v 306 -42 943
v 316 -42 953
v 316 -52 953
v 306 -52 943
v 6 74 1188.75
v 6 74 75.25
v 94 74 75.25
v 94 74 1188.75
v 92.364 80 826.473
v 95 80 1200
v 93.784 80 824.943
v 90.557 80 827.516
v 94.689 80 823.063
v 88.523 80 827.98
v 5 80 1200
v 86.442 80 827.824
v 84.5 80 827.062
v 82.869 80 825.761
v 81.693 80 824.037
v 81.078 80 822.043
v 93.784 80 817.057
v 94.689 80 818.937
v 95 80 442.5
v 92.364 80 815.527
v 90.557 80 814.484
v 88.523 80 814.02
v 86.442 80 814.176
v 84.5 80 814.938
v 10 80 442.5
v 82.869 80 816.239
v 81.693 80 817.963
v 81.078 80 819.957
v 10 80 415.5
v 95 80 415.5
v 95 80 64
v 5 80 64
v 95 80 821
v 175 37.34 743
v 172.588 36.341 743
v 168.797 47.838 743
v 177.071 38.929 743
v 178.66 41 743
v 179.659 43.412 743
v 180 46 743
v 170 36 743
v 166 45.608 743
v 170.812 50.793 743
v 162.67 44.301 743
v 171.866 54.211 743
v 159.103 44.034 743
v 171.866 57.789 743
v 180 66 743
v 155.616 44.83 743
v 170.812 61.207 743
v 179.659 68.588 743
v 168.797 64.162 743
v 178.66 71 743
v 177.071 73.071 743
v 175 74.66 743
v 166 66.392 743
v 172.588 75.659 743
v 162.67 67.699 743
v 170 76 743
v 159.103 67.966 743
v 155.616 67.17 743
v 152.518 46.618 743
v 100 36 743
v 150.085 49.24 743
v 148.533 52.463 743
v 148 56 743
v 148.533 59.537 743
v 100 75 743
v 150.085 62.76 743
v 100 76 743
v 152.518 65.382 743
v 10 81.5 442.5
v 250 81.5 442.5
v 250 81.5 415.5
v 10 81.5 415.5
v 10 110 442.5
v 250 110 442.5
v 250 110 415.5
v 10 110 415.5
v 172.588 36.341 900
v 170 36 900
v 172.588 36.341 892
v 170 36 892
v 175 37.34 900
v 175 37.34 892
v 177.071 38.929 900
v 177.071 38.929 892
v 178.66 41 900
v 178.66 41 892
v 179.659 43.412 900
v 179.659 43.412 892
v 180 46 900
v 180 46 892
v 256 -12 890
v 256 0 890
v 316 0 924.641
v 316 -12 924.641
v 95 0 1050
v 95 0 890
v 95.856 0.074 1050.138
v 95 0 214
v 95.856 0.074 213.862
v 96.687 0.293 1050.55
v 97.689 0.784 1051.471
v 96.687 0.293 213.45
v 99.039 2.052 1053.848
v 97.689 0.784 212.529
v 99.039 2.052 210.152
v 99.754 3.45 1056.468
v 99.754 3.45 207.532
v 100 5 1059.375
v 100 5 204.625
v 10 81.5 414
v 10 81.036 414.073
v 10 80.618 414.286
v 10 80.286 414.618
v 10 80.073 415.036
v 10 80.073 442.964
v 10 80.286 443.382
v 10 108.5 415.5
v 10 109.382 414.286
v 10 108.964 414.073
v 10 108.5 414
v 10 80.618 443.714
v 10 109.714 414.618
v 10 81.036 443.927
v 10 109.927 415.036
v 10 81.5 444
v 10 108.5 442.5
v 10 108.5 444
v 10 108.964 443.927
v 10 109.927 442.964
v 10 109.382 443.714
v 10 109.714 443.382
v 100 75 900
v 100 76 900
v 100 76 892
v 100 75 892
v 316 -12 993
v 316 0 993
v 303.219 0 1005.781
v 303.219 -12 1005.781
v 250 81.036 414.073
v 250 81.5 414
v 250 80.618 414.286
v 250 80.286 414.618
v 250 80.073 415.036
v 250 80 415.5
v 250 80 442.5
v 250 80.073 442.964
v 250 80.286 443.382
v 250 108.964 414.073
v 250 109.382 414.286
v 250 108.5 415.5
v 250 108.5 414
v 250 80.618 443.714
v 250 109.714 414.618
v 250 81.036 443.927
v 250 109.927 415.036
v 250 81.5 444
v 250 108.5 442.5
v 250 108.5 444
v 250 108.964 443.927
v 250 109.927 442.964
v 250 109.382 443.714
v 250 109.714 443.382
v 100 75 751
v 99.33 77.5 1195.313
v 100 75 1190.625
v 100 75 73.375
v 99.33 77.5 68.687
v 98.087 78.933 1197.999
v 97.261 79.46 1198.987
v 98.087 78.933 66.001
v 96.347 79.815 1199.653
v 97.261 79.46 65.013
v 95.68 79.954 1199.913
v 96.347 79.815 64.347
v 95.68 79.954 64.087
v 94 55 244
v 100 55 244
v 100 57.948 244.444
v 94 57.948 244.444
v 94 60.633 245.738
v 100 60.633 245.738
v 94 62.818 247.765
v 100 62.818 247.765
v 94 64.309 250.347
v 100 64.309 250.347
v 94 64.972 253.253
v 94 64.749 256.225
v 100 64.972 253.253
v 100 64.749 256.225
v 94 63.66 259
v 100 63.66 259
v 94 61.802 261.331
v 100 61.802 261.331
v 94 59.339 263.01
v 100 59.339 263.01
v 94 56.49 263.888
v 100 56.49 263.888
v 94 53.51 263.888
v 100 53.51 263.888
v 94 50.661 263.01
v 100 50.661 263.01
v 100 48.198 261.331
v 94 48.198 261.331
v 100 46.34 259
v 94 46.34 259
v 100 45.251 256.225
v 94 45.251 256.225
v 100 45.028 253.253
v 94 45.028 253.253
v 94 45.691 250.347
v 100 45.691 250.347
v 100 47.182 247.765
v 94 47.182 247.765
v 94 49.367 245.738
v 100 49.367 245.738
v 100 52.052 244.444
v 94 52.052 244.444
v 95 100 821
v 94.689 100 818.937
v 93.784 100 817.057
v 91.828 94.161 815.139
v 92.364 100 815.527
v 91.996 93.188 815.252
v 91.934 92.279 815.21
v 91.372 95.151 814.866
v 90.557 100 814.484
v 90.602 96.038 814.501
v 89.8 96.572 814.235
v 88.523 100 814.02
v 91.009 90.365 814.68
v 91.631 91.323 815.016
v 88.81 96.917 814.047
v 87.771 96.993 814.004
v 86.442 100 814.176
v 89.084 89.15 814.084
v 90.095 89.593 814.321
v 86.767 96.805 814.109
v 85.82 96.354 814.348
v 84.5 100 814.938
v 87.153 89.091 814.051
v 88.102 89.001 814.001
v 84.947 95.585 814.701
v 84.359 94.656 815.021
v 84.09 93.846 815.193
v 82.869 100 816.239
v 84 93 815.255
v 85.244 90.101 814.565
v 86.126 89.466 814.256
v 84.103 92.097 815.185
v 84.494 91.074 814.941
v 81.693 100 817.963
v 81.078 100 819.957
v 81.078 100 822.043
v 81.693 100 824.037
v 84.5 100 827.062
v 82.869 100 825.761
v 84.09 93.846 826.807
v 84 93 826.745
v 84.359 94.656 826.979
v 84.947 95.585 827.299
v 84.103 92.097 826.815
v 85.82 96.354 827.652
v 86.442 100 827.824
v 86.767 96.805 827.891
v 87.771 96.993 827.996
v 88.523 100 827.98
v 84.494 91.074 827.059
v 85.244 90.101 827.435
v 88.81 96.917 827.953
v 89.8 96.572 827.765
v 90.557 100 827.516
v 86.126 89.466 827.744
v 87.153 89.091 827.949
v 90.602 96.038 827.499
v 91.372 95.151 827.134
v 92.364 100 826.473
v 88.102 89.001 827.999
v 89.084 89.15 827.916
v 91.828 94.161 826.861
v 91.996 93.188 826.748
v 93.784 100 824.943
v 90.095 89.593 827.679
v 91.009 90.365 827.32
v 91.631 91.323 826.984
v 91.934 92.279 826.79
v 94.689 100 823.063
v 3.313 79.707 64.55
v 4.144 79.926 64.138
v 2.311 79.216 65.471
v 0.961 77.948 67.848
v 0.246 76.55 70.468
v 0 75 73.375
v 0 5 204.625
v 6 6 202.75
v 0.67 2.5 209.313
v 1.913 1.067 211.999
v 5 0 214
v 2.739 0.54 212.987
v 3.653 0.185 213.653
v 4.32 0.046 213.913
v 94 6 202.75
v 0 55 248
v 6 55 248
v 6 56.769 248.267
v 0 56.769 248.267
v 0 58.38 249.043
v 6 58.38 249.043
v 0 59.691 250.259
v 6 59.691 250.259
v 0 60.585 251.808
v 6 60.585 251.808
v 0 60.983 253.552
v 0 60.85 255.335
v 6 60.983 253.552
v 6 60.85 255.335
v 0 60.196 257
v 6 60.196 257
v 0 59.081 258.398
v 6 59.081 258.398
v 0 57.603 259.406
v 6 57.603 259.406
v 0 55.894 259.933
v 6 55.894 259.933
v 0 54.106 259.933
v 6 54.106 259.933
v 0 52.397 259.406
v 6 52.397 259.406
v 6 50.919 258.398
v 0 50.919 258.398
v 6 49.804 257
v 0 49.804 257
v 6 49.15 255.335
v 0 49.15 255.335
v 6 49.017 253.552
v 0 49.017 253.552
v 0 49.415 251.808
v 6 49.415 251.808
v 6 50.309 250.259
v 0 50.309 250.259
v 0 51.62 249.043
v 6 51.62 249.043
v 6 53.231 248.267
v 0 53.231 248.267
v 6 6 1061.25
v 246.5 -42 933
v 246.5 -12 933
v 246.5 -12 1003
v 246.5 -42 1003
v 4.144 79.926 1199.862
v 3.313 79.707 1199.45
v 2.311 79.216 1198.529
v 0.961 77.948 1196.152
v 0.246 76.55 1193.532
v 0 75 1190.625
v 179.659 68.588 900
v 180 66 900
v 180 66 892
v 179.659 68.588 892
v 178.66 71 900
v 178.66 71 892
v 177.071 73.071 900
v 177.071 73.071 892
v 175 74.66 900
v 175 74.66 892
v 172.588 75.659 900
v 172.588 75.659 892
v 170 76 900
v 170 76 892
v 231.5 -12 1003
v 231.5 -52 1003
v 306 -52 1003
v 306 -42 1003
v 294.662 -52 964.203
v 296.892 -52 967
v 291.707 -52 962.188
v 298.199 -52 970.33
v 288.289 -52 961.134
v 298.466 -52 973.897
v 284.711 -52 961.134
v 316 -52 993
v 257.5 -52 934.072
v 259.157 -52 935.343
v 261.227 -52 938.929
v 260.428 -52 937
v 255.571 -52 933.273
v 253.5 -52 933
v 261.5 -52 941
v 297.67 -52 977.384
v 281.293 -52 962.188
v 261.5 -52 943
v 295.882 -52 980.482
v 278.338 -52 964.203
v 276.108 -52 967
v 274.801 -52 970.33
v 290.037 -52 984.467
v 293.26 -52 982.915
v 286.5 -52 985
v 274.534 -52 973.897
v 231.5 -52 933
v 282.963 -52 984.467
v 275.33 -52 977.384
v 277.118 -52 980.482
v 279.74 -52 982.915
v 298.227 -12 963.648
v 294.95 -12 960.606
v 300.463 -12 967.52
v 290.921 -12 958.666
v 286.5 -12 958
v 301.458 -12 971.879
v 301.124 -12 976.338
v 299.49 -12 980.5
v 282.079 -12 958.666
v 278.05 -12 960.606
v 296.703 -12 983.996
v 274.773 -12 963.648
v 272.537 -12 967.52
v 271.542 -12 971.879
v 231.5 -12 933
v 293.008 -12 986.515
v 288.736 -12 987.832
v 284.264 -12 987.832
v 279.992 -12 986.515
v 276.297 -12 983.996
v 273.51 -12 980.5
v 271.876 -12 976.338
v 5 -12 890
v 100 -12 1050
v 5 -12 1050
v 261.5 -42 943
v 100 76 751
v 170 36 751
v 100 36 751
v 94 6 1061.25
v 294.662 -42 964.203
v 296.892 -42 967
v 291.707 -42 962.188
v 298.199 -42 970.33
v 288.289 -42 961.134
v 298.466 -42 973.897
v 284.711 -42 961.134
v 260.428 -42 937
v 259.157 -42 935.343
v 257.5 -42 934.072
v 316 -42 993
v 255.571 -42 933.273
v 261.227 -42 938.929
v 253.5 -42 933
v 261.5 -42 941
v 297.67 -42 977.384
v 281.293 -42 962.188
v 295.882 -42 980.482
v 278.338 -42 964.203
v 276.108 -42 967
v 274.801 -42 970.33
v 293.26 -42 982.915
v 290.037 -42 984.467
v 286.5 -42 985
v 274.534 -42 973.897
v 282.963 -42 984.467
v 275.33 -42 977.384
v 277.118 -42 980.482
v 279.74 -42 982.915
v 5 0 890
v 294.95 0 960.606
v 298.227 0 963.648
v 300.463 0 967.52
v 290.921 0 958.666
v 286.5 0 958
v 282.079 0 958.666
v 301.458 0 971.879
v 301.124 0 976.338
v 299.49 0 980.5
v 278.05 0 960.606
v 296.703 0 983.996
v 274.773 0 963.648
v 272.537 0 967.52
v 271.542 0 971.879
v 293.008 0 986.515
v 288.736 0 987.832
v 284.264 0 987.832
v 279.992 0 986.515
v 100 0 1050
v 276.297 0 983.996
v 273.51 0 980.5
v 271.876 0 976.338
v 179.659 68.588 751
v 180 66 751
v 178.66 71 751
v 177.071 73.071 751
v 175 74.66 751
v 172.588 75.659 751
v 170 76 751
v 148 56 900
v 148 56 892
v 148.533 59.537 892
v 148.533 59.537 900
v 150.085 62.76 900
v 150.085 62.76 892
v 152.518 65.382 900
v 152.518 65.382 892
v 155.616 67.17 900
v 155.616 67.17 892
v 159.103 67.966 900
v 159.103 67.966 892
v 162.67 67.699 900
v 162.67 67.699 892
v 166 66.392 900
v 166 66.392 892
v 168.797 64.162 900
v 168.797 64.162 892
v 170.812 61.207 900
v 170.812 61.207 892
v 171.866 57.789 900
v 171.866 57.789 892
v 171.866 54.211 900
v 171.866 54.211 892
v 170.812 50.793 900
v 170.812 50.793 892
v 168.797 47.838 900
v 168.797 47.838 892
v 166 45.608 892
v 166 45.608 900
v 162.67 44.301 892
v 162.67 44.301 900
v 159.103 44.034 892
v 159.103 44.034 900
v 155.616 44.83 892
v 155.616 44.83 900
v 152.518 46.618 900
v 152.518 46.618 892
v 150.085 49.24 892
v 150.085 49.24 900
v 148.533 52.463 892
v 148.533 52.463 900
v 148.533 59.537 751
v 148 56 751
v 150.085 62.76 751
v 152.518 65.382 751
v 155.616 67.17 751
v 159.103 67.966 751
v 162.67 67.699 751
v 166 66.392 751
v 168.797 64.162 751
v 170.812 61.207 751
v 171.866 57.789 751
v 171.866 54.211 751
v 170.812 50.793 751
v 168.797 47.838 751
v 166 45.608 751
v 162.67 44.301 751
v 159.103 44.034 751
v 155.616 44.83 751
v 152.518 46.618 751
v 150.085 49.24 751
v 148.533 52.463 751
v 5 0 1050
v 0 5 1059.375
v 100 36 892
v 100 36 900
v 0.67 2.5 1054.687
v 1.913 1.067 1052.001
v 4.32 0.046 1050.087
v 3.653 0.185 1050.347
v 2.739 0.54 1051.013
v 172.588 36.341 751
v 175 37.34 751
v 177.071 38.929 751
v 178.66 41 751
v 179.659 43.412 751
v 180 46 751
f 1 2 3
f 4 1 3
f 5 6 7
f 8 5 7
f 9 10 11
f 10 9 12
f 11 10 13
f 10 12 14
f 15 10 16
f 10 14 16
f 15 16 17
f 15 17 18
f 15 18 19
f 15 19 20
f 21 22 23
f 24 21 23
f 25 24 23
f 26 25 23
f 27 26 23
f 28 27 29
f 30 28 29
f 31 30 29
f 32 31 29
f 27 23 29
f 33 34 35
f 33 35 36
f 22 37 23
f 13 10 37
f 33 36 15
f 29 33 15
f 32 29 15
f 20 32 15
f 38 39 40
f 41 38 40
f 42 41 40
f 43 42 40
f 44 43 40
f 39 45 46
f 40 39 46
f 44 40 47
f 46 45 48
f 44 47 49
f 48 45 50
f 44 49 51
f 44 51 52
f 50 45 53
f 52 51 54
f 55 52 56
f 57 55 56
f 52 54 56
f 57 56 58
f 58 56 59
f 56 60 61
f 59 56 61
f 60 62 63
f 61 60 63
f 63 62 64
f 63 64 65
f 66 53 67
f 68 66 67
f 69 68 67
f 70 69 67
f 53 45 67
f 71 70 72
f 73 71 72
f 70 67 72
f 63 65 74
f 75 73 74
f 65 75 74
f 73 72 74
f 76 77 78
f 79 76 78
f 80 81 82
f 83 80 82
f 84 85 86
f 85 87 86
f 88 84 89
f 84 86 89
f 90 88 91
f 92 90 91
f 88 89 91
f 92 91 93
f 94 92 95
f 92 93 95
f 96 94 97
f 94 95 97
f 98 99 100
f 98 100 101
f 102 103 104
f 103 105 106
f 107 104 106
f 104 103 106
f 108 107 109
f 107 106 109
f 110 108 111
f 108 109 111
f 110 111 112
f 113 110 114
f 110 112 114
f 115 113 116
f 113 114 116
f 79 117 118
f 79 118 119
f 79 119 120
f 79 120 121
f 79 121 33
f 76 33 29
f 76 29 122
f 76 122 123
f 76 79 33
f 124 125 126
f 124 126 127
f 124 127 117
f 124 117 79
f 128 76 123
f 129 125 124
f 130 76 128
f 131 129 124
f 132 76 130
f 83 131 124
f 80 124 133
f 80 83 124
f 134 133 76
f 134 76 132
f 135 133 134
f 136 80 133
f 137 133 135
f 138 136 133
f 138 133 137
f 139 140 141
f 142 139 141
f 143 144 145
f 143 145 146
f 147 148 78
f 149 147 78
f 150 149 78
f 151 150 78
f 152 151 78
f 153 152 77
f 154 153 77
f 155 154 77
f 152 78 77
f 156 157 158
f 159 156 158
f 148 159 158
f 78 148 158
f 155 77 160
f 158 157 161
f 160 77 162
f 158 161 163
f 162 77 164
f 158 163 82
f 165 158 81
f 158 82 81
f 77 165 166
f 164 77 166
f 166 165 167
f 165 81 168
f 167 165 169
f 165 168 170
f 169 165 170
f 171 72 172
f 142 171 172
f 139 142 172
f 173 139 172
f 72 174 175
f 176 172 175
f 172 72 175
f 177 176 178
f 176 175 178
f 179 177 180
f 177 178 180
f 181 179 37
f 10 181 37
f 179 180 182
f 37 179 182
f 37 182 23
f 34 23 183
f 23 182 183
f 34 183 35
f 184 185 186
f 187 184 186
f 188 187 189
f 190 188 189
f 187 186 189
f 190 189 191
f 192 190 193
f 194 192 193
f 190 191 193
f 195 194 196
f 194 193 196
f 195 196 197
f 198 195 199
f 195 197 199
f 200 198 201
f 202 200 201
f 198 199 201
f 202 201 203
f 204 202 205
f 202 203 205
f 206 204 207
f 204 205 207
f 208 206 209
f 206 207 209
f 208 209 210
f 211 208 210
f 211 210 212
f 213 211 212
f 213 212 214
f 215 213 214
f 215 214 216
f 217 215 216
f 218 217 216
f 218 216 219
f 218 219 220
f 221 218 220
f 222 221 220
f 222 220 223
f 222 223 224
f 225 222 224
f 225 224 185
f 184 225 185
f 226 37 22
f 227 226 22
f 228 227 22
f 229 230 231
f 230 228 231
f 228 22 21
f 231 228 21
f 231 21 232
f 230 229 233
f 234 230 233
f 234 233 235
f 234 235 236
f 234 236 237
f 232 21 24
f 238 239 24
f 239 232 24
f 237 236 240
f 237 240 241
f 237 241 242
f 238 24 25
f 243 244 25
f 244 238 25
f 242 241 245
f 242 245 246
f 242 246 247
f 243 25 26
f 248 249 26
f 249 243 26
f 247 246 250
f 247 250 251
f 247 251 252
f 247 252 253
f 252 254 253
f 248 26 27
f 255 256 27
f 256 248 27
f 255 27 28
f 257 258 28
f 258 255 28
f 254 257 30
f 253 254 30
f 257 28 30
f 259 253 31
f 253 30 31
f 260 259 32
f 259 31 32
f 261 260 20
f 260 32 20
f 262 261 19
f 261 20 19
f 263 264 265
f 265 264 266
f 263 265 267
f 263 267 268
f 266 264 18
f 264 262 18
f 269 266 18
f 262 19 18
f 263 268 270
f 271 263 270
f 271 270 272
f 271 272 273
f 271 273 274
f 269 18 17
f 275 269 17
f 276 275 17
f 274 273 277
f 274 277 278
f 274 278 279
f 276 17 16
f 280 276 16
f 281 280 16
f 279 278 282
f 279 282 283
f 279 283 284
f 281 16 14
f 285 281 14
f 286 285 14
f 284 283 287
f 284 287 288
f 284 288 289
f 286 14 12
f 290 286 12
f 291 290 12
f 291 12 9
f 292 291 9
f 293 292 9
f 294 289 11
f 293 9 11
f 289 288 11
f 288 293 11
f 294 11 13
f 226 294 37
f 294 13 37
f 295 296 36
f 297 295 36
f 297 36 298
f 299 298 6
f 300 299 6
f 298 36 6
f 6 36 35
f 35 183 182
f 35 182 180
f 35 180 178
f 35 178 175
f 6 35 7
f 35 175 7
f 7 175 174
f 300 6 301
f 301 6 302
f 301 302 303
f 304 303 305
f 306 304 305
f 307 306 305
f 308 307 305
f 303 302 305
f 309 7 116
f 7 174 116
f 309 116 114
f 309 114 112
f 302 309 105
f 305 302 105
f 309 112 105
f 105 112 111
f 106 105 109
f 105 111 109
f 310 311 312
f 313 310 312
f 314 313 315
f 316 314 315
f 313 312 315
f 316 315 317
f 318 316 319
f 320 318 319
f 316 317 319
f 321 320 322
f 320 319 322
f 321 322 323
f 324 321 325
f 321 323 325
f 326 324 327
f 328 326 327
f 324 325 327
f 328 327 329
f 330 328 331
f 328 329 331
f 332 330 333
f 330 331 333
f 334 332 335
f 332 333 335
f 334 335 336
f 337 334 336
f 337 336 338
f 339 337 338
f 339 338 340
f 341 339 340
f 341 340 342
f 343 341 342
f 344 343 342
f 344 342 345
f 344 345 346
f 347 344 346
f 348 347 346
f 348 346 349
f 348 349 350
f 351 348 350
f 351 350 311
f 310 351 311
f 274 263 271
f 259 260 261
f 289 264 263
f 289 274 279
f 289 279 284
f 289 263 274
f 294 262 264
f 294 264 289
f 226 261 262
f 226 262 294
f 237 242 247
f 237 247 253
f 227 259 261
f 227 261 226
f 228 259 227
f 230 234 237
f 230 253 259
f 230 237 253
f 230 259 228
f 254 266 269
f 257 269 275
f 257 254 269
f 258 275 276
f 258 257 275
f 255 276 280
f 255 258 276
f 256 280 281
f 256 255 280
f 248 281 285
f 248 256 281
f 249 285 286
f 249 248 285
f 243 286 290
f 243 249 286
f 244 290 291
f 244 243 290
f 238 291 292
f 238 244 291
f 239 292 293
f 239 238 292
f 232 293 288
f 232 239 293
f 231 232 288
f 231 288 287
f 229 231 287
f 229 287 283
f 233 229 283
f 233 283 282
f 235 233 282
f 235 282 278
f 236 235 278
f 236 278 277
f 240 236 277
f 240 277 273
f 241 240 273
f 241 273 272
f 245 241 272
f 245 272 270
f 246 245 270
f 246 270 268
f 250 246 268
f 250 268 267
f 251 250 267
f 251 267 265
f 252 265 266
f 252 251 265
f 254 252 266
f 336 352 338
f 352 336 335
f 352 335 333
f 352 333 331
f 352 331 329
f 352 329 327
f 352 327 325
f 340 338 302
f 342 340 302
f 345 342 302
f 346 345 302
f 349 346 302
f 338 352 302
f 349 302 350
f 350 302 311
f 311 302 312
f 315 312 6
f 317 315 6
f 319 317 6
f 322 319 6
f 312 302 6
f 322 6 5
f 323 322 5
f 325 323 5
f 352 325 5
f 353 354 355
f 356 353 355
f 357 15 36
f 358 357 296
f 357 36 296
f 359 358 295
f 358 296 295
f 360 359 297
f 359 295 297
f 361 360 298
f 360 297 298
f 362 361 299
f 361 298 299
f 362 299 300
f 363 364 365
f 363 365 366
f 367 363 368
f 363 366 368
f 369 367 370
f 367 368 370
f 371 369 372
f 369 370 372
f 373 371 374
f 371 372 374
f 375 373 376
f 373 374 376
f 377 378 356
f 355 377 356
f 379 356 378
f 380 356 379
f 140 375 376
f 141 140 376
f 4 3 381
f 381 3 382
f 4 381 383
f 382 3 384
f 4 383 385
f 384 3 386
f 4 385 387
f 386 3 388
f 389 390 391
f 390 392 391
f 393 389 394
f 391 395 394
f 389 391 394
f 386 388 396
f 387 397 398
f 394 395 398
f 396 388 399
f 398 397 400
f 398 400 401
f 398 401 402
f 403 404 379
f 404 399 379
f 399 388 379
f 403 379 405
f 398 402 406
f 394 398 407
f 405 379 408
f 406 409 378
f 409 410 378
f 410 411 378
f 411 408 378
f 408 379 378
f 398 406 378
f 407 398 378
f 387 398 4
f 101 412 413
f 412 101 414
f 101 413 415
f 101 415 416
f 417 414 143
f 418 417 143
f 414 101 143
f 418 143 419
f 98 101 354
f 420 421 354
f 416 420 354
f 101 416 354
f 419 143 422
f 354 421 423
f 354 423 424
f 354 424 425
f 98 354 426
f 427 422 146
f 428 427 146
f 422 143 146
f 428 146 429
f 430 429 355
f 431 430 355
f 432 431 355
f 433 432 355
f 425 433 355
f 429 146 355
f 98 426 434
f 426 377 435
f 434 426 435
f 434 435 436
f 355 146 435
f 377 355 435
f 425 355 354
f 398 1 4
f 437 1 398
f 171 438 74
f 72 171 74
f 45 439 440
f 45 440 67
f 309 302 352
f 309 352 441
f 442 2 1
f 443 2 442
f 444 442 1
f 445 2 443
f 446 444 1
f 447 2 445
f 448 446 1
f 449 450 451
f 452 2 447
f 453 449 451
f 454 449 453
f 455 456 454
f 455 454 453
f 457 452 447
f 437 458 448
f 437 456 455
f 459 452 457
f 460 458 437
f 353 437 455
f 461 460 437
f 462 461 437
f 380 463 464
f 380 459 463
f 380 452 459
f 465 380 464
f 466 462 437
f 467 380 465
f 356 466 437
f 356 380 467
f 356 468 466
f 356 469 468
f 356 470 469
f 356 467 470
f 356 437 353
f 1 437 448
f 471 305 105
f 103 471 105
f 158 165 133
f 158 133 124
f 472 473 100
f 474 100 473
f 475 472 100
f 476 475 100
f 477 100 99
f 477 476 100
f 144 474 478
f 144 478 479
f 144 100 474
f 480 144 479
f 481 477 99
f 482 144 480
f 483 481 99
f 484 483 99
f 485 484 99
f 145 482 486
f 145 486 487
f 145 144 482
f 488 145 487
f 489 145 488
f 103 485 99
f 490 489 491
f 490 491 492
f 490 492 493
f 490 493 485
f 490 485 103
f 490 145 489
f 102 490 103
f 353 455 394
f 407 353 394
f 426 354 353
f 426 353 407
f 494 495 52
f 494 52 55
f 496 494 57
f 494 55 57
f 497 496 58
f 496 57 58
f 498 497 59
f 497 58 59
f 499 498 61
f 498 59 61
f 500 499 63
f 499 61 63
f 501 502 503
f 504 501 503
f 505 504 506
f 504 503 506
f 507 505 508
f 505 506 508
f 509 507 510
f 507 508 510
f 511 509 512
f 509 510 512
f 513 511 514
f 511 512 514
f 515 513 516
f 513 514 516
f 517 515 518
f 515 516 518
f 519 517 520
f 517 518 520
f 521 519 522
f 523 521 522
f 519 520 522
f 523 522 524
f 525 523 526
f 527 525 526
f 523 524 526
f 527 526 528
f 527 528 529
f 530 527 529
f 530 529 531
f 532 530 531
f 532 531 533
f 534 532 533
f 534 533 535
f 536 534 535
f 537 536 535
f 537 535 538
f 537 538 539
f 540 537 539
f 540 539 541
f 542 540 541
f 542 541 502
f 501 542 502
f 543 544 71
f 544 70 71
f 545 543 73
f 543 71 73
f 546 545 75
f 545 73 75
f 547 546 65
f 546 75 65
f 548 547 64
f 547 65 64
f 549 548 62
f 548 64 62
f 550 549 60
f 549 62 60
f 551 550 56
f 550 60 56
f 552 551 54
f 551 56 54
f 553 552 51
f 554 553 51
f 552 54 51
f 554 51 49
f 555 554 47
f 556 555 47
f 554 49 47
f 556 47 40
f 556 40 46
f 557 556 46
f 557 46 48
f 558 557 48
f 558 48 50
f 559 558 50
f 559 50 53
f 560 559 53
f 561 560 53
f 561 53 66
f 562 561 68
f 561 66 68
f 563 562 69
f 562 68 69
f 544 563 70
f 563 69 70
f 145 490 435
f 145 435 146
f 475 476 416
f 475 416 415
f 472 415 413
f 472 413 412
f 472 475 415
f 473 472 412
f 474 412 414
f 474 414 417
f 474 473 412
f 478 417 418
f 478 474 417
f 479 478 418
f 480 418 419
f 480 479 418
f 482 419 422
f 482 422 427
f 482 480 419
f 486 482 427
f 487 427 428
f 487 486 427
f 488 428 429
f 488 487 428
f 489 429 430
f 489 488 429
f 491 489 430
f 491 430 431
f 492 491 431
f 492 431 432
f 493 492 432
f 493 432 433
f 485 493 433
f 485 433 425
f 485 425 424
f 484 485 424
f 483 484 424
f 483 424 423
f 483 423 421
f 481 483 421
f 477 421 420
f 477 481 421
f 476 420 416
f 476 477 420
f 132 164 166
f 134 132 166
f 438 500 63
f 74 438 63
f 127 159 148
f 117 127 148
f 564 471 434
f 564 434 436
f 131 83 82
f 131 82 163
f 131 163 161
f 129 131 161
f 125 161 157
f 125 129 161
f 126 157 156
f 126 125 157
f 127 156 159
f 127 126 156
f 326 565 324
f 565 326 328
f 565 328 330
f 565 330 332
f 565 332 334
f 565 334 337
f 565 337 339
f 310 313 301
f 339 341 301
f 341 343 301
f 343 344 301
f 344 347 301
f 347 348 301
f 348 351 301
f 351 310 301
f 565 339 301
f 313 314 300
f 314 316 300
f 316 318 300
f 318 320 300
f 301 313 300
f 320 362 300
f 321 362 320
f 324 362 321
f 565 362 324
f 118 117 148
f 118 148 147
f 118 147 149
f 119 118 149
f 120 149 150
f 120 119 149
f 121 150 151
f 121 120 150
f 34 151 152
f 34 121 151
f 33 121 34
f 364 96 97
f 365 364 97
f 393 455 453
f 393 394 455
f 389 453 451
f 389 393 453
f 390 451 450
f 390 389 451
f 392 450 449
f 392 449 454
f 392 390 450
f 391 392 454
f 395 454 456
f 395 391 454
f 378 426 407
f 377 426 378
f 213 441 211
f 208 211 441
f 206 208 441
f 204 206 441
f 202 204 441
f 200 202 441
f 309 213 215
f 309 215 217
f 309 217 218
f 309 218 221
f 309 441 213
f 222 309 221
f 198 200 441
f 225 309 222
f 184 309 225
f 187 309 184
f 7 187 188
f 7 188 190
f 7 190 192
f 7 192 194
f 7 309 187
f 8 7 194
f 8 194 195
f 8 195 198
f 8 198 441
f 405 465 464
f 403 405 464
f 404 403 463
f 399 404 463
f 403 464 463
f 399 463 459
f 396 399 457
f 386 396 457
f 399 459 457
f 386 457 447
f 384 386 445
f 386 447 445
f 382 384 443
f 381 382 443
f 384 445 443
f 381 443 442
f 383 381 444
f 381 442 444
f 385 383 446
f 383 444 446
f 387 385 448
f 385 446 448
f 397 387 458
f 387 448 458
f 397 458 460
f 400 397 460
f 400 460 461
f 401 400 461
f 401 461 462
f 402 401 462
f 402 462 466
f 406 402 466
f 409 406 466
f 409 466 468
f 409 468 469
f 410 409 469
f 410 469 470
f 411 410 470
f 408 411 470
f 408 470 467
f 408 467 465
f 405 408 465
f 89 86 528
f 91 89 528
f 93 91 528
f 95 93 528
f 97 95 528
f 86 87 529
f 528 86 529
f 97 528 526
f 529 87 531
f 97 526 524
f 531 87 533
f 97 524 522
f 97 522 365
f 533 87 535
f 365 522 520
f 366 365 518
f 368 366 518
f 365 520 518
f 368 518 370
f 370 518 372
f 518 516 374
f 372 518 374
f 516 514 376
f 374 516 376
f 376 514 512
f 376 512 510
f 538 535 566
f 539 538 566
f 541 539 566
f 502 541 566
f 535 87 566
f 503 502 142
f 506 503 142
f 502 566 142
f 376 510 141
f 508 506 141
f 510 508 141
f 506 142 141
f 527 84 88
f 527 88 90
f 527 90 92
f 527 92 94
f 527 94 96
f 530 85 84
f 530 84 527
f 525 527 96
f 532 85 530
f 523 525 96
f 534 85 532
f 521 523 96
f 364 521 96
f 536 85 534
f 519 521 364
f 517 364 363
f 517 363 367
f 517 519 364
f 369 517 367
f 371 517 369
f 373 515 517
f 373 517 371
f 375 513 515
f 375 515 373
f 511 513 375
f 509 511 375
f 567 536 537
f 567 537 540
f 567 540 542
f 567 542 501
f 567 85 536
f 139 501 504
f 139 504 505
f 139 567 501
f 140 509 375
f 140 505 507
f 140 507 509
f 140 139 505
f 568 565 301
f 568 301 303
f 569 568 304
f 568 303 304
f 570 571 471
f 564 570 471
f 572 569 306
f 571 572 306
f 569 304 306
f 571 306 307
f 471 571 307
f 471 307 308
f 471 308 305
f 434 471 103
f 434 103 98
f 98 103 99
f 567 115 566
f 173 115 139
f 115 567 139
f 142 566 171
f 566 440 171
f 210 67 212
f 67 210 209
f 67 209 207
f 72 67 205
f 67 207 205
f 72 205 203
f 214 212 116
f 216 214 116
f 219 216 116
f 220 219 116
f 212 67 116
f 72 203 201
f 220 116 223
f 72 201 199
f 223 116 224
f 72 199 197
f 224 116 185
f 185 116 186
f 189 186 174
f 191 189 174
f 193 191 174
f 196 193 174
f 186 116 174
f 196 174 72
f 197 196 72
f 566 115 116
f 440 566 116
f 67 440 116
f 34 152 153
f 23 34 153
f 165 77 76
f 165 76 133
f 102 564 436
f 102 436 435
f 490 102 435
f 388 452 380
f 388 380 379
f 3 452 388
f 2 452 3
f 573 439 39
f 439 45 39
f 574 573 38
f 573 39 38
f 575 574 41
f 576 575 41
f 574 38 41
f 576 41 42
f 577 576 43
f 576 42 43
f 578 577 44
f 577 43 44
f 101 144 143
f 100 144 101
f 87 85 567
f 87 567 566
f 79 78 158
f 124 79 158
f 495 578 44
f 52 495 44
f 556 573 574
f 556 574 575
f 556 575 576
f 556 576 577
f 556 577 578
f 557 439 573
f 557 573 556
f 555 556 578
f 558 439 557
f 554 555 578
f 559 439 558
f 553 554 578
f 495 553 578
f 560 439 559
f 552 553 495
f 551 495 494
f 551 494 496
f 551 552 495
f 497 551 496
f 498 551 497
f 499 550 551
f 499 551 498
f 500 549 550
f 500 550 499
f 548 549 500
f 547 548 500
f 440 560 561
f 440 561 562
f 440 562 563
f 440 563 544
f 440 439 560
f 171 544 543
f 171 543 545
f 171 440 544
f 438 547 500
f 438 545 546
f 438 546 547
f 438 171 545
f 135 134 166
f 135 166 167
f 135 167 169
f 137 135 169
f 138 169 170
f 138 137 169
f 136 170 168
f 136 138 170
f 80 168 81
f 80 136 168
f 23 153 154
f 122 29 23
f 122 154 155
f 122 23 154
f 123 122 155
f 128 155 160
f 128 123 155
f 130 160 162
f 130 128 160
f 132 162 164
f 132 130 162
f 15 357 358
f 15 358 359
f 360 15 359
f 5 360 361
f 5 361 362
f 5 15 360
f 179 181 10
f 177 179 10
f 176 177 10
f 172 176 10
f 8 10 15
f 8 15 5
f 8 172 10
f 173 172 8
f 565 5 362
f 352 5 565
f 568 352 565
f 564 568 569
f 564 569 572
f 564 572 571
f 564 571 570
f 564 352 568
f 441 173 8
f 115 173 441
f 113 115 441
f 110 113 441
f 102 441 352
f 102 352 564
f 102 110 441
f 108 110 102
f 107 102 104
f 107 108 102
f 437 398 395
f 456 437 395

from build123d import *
from OCP.BRepFilletAPI import BRepFilletAPI_MakeChamfer

# Parameters (mm, degrees)
SCHIZZO1_W                      = 88
SCHIZZO1_H                      = 68
ESTRUSIONE_SOTTILE1_DEPTH       = 1200
ESTRUSIONE1_DEPTH               = 1207.813987324
SCHIZZO4_R                      = 15
ESTRUSIONE3_DEPTH               = 12
SCHIZZO5_W                      = 15
SCHIZZO5_H                      = 70
ESTRUSIONE4_DEPTH               = 30
ESTRUSIONE5_DEPTH               = 10
SCHIZZO8_R                      = 12
ESTRUSIONE6_DEPTH               = 1244.48542412
SMUSSO1_SIZE                    = 60
SMUSSO1_SIZE2                   = 34.641016151
SMUSSO2_SIZE                    = 10
SMUSSO2_SIZE2                   = 13.08013562
RACCORDO1_R                     = 8
SCHIZZO9_R                      = 6
ESTRUSIONE7_DEPTH               = 1222.90670675
SCHIZZO10_R                     = 10
ESTRUSIONE8_DEPTH               = 10
ESTRUSIONE_SOTTILE2_DEPTH       = 150
ESTRUSIONE_SOTTILE2_DEPTH_BACK  = 90
SCHIZZO11_W                     = 27
SCHIZZO11_H                     = 27
SCHIZZO12_W                     = 8
SCHIZZO12_H                     = 40
ESTRUSIONE_ESTRUSIONE1_DEPTH    = 80
SCHIZZO13_R                     = 12
TAGLIO_ESTRUSIONE1_DEPTH        = 894.050950394
RACCORDO2_R                     = 10
RIPETIZIONE_A_L1_COUNT          = 2
RIPETIZIONE_A_L1_PITCH          = 149
RACCORDO2_OF_RIPETIZIONE_A_L1_R = 10
SCHIZZO14_R                     = 7
ESTRUSIONE_ESTRUSIONE2_DEPTH    = 20
TAGLIO_ESTRUSIONE2_START        = 670
SCHIZZO15_R                     = 4
TAGLIO_ESTRUSIONE2_DEPTH        = 250


with BuildPart() as part:
    # Schizzo1 → Estrusione-Sottile1 (new body)
    with BuildSketch(Plane.XY):
        with BuildLine():
            Line((5, 0), (95, 0))
            ThreePointArc((95, 0), (98.535533906, 1.464466094), (100, 5))
            Line((100, 5), (100, 75))
            ThreePointArc((100, 75), (98.535533906, 78.535533906), (95, 80))
            Line((95, 80), (5, 80))
            ThreePointArc((5, 80), (1.464466094, 78.535533906), (0, 75))
            Line((0, 75), (0, 5))
            ThreePointArc((0, 5), (1.464466094, 1.464466094), (5, 0))
        make_face()
        with Locations((50, 40)):
            Rectangle(SCHIZZO1_W, SCHIZZO1_H, mode=Mode.SUBTRACT)
    extrude(amount=ESTRUSIONE_SOTTILE1_DEPTH)

    # Schizzo2 → Estrusione1 (cut, through all)
    with BuildSketch(Plane(origin=(100, 0, 0), x_dir=(0, 0, -1), z_dir=(1, 0, 0))):
        Polygon((-1200, 80), (-1050, 0), (-1200, 0), align=None)
        Polygon((-64, 80), (-214, 0), (0, 0), (0, 80), align=None)
    extrude(amount=-ESTRUSIONE1_DEPTH, mode=Mode.SUBTRACT)

    # Schizzo4 → Estrusione3 (add)
    with BuildSketch(Plane.XZ):
        Polygon((5, 1050), (100, 1050), (316, 1003), (316, 890), (95, 890), (5, 890), align=None)
        with Locations(Location((286.5, 973, 0), (0, 0, 270))):
            Circle(SCHIZZO4_R, mode=Mode.SUBTRACT)
    extrude(amount=ESTRUSIONE3_DEPTH)

    # Schizzo5 → Estrusione4 (add)
    with BuildSketch(Plane.XZ.offset(12)):
        with Locations((239, 968)):
            Rectangle(SCHIZZO5_W, SCHIZZO5_H)
    extrude(amount=ESTRUSIONE4_DEPTH)

    # Schizzo7 → Estrusione5 (add)
    with BuildSketch(Plane.XZ.offset(42)):
        Polygon((231.5, 1003), (316, 1003), (316, 943), (261.5, 943), (261.5, 933), (231.5, 933), align=None)
    extrude(amount=ESTRUSIONE5_DEPTH)

    # Schizzo8 → Estrusione6 (cut, through all)
    with BuildSketch(Plane(origin=(0, 0, 0), x_dir=(1, 0, 0), z_dir=(0, 1, 0))):
        with Locations(Location((286.5, -973, 0), (0, 0, 270))):
            Circle(SCHIZZO8_R)
    extrude(amount=-ESTRUSIONE6_DEPTH, mode=Mode.SUBTRACT)

    # Smusso1
    smusso1_edges = [part.edges().sort_by_distance(p)[0] for p in [
        (316, -6, 890),
    ]]
    smusso1_side = [part.faces().sort_by_distance(p)[0] for p in [
        (160.5, -6, 890),
    ]]
    chamfer(smusso1_edges, length=SMUSSO1_SIZE, length2=SMUSSO1_SIZE2, reference=smusso1_side[0])

    # Smusso2: one chamfer whose edges measure the first distance from different faces: ONE call of the kernel's chamfer builder (chamfer() names one face for all edges)
    smusso2_edges_1 = [part.edges().sort_by_distance(p)[0] for p in [
        (316, -6, 1003),
    ]]
    smusso2_side_1 = [part.faces().sort_by_distance(p)[0] for p in [
        (316, -6, 963.820508076),
    ]]
    smusso2_edges_2 = [part.edges().sort_by_distance(p)[0] for p in [
        (316, -47, 1003),
        (316, -47, 943),
    ]]
    smusso2 = BRepFilletAPI_MakeChamfer(part.part.solid().wrapped)
    for e in smusso2_edges_1:
        smusso2.Add(SMUSSO2_SIZE, SMUSSO2_SIZE2, e.wrapped, smusso2_side_1[0].wrapped)  # the first distance lies on this face
    for e in smusso2_edges_2:
        smusso2.Add(SMUSSO2_SIZE, e.wrapped)
    add(Compound.cast(smusso2.Shape()), mode=Mode.REPLACE)

    # Raccordo1
    raccordo1_edges = [part.edges().sort_by_distance(p)[0] for p in [
        (261.5, -47, 933),
    ]]
    fillet(raccordo1_edges, radius=RACCORDO1_R)

    # Schizzo9 → Estrusione7 (cut, through all)
    with BuildSketch(Plane(origin=(100, 0, 0), x_dir=(0, 0, -1), z_dir=(1, 0, 0))):
        with Locations((-254, 55)):
            Circle(SCHIZZO9_R)
    extrude(amount=-ESTRUSIONE7_DEPTH, mode=Mode.SUBTRACT)

    # Schizzo10 → Estrusione8 (cut)
    with BuildSketch(Plane(origin=(100, 0, 0), x_dir=(0, 0, -1), z_dir=(1, 0, 0))):
        with Locations((-254, 55)):
            Circle(SCHIZZO10_R)
    extrude(amount=-ESTRUSIONE8_DEPTH, mode=Mode.SUBTRACT)

    # Schizzo11 → Estrusione-Sottile2 (add, two sides: drawn at the far end of the back side and taken through both)
    with BuildSketch(Plane(origin=(100, 0, 0), x_dir=(0, 0, -1), z_dir=(1, 0, 0)).offset(-ESTRUSIONE_SOTTILE2_DEPTH_BACK)):
        with BuildLine():
            Line((-442.5, 110), (-415.5, 110))
            ThreePointArc((-415.5, 110), (-414.439339828, 109.560660172), (-414, 108.5))
            Line((-414, 108.5), (-414, 81.5))
            ThreePointArc((-414, 81.5), (-414.439339828, 80.439339828), (-415.5, 80))
            Line((-415.5, 80), (-442.5, 80))
            ThreePointArc((-442.5, 80), (-443.560660172, 80.439339828), (-444, 81.5))
            Line((-444, 81.5), (-444, 108.5))
            ThreePointArc((-444, 108.5), (-443.560660172, 109.560660172), (-442.5, 110))
        make_face()
        with Locations((-429, 95)):
            Rectangle(SCHIZZO11_W, SCHIZZO11_H, mode=Mode.SUBTRACT)
    extrude(amount=ESTRUSIONE_SOTTILE2_DEPTH + ESTRUSIONE_SOTTILE2_DEPTH_BACK)

    # Schizzo12 → Estrusione-Estrusione1 (add)
    with BuildSketch(Plane(origin=(100, 0, 0), x_dir=(0, 0, -1), z_dir=(1, 0, 0))):
        with Locations((-896, 56)):
            Rectangle(SCHIZZO12_W, SCHIZZO12_H)
    estrusione_estrusione1 = extrude(amount=ESTRUSIONE_ESTRUSIONE1_DEPTH)

    # Schizzo13 → Taglio-Estrusione1 (cut, through all)
    with BuildSketch(Plane(origin=(0, 0, 892), x_dir=(-1, 0, 0), z_dir=(0, 0, -1))):
        with Locations((-160, 56)):
            Circle(SCHIZZO13_R)
    taglio_estrusione1 = extrude(amount=-TAGLIO_ESTRUSIONE1_DEPTH, mode=Mode.SUBTRACT)

    # Raccordo2
    raccordo2_edges = [part.edges().sort_by_distance(p)[0] for p in [
        (180, 36, 896),
        (180, 76, 896),
    ]]
    fillet(raccordo2_edges, radius=RACCORDO2_R)

    # Ripetizione a L1: Estrusione-Estrusione1, Taglio-Estrusione1 ×2
    with Locations(*[(0, 0, -i * RIPETIZIONE_A_L1_PITCH) for i in range(1, RIPETIZIONE_A_L1_COUNT)]):
        add(estrusione_estrusione1)
        add(taglio_estrusione1, mode=Mode.SUBTRACT)

    # Raccordo2 of Ripetizione a L1
    raccordo2_of_ripetizione_a_l1_edges = [part.edges().sort_by_distance(p)[0] for p in [
        (180, 36, 747),
        (180, 76, 747),
    ]]
    fillet(raccordo2_of_ripetizione_a_l1_edges, radius=RACCORDO2_OF_RIPETIZIONE_A_L1_R)

    # Schizzo14 → Estrusione-Estrusione2 (add)
    with BuildSketch(Plane(origin=(0, 80, 0), x_dir=(1, 0, 0), z_dir=(0, 1, 0))):
        with Locations((88, -821)):
            Circle(SCHIZZO14_R)
    extrude(amount=ESTRUSIONE_ESTRUSIONE2_DEPTH)

    # Schizzo15 → Taglio-Estrusione2 (cut)
    with BuildSketch(Plane.XY.offset(TAGLIO_ESTRUSIONE2_START)):
        with Locations(Location((88, 93, 0), (0, 0, 180))):
            Circle(SCHIZZO15_R)
    extrude(amount=TAGLIO_ESTRUSIONE2_DEPTH, mode=Mode.SUBTRACT)


solid = part.part
